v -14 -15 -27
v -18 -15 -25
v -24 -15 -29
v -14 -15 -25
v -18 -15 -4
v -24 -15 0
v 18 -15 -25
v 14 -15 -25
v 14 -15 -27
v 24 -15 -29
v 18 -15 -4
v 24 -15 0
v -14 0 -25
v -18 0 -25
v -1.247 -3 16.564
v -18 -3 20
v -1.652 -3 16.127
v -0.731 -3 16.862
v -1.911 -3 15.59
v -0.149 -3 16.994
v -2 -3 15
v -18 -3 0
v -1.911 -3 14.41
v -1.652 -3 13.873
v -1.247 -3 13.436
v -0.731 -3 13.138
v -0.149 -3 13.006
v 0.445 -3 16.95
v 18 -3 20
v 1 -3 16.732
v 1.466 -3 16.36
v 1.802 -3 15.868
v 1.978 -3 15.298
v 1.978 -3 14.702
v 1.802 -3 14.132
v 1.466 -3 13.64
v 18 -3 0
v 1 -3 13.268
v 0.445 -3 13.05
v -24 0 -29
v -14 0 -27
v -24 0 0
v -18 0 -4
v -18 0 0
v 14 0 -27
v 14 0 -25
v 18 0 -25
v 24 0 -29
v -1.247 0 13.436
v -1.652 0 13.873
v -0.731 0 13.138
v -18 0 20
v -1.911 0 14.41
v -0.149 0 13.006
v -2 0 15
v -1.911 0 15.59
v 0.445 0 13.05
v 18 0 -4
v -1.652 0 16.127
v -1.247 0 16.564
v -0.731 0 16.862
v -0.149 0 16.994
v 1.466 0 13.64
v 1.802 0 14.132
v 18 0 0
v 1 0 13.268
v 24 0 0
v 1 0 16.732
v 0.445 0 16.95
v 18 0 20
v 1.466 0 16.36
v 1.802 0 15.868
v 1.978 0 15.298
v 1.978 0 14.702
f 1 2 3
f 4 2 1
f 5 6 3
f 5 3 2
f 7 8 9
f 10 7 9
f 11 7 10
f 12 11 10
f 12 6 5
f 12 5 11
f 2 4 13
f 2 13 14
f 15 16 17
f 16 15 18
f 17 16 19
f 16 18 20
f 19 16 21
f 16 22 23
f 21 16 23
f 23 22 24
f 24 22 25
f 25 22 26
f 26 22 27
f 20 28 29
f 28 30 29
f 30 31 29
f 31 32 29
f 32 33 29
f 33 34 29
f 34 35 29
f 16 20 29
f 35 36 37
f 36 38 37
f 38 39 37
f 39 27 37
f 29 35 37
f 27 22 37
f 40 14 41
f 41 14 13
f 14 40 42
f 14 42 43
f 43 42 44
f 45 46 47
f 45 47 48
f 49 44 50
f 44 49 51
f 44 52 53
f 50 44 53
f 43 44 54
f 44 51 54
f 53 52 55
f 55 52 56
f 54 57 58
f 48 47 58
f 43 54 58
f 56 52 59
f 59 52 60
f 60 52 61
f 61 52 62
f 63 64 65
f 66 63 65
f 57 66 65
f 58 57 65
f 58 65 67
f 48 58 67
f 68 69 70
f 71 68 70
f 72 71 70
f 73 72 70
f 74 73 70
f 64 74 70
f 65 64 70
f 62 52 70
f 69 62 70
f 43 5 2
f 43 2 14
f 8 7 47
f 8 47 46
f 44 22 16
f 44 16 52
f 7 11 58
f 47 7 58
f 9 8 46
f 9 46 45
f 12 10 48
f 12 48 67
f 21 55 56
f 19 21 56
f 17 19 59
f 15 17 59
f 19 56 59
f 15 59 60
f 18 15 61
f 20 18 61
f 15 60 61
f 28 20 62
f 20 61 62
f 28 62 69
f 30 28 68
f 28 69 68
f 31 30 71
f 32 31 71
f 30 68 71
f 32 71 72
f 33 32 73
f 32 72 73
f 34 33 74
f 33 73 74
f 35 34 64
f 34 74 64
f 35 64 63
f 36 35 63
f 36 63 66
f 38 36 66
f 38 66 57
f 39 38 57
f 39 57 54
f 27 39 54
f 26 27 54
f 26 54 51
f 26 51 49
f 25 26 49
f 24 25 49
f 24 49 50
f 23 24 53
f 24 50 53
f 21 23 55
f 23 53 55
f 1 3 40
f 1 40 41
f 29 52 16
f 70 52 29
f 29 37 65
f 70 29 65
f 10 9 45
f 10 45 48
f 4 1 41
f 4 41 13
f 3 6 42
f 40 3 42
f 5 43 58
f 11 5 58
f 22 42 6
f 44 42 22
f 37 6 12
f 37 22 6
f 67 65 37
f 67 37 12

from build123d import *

# Parameters (mm, degrees)
F0_W     = 6
F0_H     = 15
F0_W_2   = 36
F1_DEPTH = 4
F2_DEPTH = 25
F4_DEPTH = 15
F5_W     = 36
F5_H     = 3
F6_DEPTH = 20
F7_R     = 2
F8_DEPTH = 3


with BuildPart() as f1:
    # F0 (on Top) → F1 (new body)
    with BuildSketch(Plane.XY):
        with Locations((-21, -7.5)):
            Rectangle(F0_W, F0_H)
        with Locations((0, -7.5)):
            Rectangle(F0_W_2, F0_H)
        with Locations((21, -7.5)):
            Rectangle(F0_W, F0_H)
    extrude(amount=-F1_DEPTH)

    # F0 (on Top) → F2 (join)
    with BuildSketch(Plane.XY):
        with Locations((-21, -7.5)):
            Rectangle(F0_W, F0_H)
        with Locations((21, -7.5)):
            Rectangle(F0_W, F0_H)
    extrude(amount=-F2_DEPTH)

    # F3 (on face) → F4 (join, through all)
    with BuildSketch(Plane.XZ.offset(15)):
        Polygon((24, -29), (24, -25), (18, -25), (14, -25), (14, -27), align=None)
        Polygon((-18, -25), (-24, -25), (-24, -29), (-14, -27), (-14, -25), align=None)
    extrude(amount=-F4_DEPTH)

    # F5 (on Top) → F6 (join)
    with BuildSketch(Plane.XY):
        with Locations((0, -1.5)):
            Rectangle(F5_W, F5_H)
    extrude(amount=F6_DEPTH)

    # F7 (on face) → F8 (cut, through all)
    with BuildSketch(Plane(origin=(0, 0, 0), x_dir=(-1, 0, 0), z_dir=(0, 1, 0))):
        with Locations((0, 15)):
            Circle(F7_R)
    extrude(amount=-F8_DEPTH, mode=Mode.SUBTRACT)


solid = f1.part
